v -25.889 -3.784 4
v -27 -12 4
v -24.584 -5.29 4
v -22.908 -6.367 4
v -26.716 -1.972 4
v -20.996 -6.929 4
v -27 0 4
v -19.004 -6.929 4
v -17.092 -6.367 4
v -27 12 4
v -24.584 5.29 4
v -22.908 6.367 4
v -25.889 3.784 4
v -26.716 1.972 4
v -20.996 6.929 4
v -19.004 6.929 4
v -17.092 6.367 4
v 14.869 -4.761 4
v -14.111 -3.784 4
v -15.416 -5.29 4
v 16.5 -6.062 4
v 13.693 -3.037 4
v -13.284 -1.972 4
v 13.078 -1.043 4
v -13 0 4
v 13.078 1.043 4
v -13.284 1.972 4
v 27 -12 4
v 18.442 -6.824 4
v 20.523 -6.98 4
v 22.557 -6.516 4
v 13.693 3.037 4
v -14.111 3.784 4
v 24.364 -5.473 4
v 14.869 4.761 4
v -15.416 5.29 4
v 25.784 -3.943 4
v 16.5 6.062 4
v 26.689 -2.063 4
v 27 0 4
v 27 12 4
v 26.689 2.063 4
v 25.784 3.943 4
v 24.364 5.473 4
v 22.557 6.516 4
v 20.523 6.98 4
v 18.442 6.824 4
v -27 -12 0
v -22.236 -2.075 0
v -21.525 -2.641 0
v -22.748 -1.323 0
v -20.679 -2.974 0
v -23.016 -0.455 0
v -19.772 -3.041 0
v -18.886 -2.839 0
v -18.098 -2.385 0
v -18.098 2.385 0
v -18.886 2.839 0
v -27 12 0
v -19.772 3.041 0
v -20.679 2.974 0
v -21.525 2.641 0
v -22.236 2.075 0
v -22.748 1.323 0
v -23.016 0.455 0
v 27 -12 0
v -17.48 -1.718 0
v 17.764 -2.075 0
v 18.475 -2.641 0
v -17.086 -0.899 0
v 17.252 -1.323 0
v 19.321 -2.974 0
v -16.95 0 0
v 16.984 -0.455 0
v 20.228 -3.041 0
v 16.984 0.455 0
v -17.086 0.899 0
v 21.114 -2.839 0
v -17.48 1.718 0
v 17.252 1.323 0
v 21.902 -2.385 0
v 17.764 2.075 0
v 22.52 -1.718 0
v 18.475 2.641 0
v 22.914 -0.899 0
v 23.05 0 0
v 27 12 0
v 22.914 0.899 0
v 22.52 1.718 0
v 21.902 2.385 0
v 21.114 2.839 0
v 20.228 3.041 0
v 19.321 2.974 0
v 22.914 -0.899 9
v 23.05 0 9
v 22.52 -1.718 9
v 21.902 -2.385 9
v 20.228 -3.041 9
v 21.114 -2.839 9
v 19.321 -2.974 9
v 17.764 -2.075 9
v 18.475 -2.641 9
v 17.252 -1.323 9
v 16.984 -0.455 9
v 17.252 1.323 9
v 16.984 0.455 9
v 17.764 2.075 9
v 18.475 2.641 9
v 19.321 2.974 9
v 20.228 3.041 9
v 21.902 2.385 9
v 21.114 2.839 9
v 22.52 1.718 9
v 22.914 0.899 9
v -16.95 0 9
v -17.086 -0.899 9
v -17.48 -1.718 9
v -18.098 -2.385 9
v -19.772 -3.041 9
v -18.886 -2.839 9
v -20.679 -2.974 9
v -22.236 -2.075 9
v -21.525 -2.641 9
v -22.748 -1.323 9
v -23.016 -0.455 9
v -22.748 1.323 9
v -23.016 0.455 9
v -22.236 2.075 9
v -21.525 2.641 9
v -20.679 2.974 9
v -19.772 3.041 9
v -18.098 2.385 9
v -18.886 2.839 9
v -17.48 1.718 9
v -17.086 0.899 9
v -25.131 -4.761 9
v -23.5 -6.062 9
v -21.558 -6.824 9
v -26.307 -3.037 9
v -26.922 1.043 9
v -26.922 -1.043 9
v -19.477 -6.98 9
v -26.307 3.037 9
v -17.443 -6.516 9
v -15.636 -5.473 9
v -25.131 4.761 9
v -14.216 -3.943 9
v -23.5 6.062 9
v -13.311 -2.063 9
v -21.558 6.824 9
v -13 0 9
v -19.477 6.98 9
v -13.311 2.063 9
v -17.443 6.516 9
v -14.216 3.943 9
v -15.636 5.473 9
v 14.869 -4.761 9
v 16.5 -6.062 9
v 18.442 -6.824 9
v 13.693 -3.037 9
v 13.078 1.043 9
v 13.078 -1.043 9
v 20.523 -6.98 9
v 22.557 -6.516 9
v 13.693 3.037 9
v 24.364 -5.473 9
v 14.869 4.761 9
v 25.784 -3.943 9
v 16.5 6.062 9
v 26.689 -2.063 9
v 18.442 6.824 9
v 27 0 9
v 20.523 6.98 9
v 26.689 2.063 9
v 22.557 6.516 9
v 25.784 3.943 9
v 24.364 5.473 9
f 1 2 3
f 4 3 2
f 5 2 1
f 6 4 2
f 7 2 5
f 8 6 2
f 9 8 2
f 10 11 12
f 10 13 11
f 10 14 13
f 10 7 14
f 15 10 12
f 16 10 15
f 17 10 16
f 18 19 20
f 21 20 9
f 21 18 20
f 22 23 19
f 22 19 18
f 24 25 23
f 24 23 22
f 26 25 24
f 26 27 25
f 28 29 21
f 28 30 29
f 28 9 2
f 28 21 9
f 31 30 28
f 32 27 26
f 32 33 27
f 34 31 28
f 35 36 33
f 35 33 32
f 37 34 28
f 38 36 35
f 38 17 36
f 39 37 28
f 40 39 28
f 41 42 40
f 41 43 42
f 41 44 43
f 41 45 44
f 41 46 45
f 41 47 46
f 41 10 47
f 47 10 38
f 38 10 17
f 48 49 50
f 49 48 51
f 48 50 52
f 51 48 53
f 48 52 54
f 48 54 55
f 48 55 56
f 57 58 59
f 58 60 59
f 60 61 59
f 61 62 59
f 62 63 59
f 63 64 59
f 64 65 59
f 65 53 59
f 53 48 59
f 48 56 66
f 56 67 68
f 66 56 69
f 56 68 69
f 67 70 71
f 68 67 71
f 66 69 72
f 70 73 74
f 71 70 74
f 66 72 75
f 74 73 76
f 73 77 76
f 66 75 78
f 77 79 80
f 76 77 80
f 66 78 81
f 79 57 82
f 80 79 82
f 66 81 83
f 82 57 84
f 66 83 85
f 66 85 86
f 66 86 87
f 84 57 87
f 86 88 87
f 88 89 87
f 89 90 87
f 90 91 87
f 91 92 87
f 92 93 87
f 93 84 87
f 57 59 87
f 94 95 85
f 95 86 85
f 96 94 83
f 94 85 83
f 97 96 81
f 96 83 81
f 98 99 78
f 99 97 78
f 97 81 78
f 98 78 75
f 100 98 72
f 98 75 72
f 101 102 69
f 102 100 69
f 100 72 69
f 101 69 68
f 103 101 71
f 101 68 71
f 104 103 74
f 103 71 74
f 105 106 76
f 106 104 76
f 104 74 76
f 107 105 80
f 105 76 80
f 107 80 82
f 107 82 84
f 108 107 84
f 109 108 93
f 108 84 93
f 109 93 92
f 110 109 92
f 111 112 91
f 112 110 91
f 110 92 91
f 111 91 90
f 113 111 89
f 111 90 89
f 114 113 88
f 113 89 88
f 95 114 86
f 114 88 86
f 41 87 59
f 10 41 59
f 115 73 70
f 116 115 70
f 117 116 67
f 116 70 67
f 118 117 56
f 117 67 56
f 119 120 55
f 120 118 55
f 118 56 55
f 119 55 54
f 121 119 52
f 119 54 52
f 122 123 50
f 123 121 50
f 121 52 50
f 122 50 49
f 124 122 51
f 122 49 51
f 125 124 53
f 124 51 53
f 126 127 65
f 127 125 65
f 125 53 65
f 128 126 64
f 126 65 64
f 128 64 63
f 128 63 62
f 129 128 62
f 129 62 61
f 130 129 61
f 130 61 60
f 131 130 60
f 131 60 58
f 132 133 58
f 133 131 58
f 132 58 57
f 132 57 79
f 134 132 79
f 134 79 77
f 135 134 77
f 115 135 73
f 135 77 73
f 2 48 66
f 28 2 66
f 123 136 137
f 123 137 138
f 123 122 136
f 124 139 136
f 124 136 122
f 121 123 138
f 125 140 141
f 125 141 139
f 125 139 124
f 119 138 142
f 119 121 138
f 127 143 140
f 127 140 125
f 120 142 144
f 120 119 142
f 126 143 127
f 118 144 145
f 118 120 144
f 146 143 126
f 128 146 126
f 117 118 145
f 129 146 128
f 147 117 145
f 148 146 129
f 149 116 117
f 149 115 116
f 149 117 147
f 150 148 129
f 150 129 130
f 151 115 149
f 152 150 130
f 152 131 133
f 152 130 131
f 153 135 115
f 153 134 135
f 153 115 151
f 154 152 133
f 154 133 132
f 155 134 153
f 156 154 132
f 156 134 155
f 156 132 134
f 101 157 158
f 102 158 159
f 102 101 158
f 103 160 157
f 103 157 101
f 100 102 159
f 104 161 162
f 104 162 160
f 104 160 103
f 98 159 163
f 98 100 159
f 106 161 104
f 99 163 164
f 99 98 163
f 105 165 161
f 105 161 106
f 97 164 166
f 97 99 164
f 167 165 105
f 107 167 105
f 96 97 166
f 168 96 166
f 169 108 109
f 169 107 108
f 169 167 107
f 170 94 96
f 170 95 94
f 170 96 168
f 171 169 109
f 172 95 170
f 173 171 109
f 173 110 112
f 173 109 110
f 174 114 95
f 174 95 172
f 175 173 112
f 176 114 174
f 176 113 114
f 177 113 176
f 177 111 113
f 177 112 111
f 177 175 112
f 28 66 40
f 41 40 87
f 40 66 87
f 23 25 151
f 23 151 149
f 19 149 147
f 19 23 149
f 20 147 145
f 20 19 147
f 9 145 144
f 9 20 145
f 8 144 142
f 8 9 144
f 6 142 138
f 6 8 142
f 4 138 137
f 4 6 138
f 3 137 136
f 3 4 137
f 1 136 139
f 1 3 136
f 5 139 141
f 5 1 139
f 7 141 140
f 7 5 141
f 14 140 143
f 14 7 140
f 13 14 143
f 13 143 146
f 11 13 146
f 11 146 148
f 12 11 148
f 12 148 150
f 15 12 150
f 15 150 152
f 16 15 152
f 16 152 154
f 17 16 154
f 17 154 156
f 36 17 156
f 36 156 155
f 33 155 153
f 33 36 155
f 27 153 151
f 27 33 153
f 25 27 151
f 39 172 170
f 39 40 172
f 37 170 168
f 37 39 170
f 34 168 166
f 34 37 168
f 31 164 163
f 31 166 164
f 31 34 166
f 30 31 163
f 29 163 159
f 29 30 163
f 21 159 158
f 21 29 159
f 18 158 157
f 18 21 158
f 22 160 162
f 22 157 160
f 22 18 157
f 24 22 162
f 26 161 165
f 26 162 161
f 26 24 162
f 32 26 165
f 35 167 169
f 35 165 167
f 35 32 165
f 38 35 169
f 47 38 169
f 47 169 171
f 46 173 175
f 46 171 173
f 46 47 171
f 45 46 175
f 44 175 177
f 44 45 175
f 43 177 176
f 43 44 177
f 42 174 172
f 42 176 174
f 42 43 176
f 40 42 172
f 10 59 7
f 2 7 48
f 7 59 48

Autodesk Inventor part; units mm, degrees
ref_plane "YZ Plane" through (0, 0, 0) normal (1, 0, 0) x (0, 1, 0)
ref_plane "XZ Plane" through (0, 0, 0) normal (0, 1, 0) x (-1, 0, 0)
ref_plane "XY Plane" through (0, 0, 0) normal (0, 0, 1) x (1, 0, 0)
sketch "Skizze1" plane through (0, 0, 0) normal (0, 0, 1) x (1, 0, 0)
  line L0 (-27, -12) -> (27, -12)
  line L1 (27, -12) -> (27, 12)
  line L2 (27, 12) -> (-27, 12)
  line L3 (-27, 12) -> (-27, -12)
  circle A0 centre (-20, 0) radius 3.05
  circle A1 centre (20, 0) radius 3.05
  point P0 (0, 0)
  dimension "d0" = 54
  dimension "d1" = 24
  dimension "d2" = 12
  dimension "d3" = 27
  dimension "d4" = 6.1
  dimension "d5" = 20
  dimension "d6" = 12
  dimension "d7" = 20
  dimension "d8" = 6.1
  dimension "d9" = 12
extrude "Extrusion1" add sketch "Skizze1" along normal blind 4
sketch "Skizze2" plane through (0, 0, 4) normal (0, 0, 1) x (1, 0, 0)
  circle A0 centre (-20, 0) radius 3.05 projected
  circle A1 centre (20, 0) radius 3.05 projected
  circle A2 centre (-20, 0) radius 7
  circle A3 centre (-20, 0) radius 3.05
  circle A4 centre (20, 0) radius 3.05
  circle A5 centre (20, 0) radius 7
  point P0 (0, 0)
  dimension "d3" = 27
  dimension "d12" = 6.1
  dimension "d13" = 14
  dimension "d14" = 6.1
  dimension "d15" = 14
extrude "Extrusion2" add sketch "Skizze2" along normal blind 5
properties part number "B Oben"
